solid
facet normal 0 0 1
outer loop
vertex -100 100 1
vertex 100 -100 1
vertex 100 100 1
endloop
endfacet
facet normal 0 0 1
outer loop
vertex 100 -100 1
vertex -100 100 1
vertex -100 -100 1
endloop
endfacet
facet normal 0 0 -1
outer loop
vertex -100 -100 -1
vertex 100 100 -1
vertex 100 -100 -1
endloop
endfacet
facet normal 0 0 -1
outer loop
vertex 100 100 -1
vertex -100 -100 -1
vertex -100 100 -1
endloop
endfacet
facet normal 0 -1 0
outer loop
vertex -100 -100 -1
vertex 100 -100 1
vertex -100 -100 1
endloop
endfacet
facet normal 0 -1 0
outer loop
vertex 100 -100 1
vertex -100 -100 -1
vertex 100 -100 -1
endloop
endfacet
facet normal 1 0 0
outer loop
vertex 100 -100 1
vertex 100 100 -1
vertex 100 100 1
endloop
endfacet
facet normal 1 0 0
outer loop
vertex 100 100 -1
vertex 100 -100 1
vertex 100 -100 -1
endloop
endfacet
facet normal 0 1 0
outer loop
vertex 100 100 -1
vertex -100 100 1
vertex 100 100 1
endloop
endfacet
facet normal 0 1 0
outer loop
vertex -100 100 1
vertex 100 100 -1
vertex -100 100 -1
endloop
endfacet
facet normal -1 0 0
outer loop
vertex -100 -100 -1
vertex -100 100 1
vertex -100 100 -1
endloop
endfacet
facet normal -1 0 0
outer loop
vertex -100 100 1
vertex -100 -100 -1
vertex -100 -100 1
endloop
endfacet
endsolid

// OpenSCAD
// Parameters
sheet_length = 200; //[100:400:1]
sheet_width  = 200; //[100:400:1]
sheet_thickness = 2; //[1:4:0.5]

// Ensure non-zero printable thickness to avoid "blank" renders
min_th = 0.2;
th = max(sheet_thickness, min_th);

// Geometry
module sheet_body() {
  color([0.85, 0.85, 0.8])
    cube([sheet_length, sheet_width, th], center=true);
}

// Final Output (one connected solid)
sheet_body();
